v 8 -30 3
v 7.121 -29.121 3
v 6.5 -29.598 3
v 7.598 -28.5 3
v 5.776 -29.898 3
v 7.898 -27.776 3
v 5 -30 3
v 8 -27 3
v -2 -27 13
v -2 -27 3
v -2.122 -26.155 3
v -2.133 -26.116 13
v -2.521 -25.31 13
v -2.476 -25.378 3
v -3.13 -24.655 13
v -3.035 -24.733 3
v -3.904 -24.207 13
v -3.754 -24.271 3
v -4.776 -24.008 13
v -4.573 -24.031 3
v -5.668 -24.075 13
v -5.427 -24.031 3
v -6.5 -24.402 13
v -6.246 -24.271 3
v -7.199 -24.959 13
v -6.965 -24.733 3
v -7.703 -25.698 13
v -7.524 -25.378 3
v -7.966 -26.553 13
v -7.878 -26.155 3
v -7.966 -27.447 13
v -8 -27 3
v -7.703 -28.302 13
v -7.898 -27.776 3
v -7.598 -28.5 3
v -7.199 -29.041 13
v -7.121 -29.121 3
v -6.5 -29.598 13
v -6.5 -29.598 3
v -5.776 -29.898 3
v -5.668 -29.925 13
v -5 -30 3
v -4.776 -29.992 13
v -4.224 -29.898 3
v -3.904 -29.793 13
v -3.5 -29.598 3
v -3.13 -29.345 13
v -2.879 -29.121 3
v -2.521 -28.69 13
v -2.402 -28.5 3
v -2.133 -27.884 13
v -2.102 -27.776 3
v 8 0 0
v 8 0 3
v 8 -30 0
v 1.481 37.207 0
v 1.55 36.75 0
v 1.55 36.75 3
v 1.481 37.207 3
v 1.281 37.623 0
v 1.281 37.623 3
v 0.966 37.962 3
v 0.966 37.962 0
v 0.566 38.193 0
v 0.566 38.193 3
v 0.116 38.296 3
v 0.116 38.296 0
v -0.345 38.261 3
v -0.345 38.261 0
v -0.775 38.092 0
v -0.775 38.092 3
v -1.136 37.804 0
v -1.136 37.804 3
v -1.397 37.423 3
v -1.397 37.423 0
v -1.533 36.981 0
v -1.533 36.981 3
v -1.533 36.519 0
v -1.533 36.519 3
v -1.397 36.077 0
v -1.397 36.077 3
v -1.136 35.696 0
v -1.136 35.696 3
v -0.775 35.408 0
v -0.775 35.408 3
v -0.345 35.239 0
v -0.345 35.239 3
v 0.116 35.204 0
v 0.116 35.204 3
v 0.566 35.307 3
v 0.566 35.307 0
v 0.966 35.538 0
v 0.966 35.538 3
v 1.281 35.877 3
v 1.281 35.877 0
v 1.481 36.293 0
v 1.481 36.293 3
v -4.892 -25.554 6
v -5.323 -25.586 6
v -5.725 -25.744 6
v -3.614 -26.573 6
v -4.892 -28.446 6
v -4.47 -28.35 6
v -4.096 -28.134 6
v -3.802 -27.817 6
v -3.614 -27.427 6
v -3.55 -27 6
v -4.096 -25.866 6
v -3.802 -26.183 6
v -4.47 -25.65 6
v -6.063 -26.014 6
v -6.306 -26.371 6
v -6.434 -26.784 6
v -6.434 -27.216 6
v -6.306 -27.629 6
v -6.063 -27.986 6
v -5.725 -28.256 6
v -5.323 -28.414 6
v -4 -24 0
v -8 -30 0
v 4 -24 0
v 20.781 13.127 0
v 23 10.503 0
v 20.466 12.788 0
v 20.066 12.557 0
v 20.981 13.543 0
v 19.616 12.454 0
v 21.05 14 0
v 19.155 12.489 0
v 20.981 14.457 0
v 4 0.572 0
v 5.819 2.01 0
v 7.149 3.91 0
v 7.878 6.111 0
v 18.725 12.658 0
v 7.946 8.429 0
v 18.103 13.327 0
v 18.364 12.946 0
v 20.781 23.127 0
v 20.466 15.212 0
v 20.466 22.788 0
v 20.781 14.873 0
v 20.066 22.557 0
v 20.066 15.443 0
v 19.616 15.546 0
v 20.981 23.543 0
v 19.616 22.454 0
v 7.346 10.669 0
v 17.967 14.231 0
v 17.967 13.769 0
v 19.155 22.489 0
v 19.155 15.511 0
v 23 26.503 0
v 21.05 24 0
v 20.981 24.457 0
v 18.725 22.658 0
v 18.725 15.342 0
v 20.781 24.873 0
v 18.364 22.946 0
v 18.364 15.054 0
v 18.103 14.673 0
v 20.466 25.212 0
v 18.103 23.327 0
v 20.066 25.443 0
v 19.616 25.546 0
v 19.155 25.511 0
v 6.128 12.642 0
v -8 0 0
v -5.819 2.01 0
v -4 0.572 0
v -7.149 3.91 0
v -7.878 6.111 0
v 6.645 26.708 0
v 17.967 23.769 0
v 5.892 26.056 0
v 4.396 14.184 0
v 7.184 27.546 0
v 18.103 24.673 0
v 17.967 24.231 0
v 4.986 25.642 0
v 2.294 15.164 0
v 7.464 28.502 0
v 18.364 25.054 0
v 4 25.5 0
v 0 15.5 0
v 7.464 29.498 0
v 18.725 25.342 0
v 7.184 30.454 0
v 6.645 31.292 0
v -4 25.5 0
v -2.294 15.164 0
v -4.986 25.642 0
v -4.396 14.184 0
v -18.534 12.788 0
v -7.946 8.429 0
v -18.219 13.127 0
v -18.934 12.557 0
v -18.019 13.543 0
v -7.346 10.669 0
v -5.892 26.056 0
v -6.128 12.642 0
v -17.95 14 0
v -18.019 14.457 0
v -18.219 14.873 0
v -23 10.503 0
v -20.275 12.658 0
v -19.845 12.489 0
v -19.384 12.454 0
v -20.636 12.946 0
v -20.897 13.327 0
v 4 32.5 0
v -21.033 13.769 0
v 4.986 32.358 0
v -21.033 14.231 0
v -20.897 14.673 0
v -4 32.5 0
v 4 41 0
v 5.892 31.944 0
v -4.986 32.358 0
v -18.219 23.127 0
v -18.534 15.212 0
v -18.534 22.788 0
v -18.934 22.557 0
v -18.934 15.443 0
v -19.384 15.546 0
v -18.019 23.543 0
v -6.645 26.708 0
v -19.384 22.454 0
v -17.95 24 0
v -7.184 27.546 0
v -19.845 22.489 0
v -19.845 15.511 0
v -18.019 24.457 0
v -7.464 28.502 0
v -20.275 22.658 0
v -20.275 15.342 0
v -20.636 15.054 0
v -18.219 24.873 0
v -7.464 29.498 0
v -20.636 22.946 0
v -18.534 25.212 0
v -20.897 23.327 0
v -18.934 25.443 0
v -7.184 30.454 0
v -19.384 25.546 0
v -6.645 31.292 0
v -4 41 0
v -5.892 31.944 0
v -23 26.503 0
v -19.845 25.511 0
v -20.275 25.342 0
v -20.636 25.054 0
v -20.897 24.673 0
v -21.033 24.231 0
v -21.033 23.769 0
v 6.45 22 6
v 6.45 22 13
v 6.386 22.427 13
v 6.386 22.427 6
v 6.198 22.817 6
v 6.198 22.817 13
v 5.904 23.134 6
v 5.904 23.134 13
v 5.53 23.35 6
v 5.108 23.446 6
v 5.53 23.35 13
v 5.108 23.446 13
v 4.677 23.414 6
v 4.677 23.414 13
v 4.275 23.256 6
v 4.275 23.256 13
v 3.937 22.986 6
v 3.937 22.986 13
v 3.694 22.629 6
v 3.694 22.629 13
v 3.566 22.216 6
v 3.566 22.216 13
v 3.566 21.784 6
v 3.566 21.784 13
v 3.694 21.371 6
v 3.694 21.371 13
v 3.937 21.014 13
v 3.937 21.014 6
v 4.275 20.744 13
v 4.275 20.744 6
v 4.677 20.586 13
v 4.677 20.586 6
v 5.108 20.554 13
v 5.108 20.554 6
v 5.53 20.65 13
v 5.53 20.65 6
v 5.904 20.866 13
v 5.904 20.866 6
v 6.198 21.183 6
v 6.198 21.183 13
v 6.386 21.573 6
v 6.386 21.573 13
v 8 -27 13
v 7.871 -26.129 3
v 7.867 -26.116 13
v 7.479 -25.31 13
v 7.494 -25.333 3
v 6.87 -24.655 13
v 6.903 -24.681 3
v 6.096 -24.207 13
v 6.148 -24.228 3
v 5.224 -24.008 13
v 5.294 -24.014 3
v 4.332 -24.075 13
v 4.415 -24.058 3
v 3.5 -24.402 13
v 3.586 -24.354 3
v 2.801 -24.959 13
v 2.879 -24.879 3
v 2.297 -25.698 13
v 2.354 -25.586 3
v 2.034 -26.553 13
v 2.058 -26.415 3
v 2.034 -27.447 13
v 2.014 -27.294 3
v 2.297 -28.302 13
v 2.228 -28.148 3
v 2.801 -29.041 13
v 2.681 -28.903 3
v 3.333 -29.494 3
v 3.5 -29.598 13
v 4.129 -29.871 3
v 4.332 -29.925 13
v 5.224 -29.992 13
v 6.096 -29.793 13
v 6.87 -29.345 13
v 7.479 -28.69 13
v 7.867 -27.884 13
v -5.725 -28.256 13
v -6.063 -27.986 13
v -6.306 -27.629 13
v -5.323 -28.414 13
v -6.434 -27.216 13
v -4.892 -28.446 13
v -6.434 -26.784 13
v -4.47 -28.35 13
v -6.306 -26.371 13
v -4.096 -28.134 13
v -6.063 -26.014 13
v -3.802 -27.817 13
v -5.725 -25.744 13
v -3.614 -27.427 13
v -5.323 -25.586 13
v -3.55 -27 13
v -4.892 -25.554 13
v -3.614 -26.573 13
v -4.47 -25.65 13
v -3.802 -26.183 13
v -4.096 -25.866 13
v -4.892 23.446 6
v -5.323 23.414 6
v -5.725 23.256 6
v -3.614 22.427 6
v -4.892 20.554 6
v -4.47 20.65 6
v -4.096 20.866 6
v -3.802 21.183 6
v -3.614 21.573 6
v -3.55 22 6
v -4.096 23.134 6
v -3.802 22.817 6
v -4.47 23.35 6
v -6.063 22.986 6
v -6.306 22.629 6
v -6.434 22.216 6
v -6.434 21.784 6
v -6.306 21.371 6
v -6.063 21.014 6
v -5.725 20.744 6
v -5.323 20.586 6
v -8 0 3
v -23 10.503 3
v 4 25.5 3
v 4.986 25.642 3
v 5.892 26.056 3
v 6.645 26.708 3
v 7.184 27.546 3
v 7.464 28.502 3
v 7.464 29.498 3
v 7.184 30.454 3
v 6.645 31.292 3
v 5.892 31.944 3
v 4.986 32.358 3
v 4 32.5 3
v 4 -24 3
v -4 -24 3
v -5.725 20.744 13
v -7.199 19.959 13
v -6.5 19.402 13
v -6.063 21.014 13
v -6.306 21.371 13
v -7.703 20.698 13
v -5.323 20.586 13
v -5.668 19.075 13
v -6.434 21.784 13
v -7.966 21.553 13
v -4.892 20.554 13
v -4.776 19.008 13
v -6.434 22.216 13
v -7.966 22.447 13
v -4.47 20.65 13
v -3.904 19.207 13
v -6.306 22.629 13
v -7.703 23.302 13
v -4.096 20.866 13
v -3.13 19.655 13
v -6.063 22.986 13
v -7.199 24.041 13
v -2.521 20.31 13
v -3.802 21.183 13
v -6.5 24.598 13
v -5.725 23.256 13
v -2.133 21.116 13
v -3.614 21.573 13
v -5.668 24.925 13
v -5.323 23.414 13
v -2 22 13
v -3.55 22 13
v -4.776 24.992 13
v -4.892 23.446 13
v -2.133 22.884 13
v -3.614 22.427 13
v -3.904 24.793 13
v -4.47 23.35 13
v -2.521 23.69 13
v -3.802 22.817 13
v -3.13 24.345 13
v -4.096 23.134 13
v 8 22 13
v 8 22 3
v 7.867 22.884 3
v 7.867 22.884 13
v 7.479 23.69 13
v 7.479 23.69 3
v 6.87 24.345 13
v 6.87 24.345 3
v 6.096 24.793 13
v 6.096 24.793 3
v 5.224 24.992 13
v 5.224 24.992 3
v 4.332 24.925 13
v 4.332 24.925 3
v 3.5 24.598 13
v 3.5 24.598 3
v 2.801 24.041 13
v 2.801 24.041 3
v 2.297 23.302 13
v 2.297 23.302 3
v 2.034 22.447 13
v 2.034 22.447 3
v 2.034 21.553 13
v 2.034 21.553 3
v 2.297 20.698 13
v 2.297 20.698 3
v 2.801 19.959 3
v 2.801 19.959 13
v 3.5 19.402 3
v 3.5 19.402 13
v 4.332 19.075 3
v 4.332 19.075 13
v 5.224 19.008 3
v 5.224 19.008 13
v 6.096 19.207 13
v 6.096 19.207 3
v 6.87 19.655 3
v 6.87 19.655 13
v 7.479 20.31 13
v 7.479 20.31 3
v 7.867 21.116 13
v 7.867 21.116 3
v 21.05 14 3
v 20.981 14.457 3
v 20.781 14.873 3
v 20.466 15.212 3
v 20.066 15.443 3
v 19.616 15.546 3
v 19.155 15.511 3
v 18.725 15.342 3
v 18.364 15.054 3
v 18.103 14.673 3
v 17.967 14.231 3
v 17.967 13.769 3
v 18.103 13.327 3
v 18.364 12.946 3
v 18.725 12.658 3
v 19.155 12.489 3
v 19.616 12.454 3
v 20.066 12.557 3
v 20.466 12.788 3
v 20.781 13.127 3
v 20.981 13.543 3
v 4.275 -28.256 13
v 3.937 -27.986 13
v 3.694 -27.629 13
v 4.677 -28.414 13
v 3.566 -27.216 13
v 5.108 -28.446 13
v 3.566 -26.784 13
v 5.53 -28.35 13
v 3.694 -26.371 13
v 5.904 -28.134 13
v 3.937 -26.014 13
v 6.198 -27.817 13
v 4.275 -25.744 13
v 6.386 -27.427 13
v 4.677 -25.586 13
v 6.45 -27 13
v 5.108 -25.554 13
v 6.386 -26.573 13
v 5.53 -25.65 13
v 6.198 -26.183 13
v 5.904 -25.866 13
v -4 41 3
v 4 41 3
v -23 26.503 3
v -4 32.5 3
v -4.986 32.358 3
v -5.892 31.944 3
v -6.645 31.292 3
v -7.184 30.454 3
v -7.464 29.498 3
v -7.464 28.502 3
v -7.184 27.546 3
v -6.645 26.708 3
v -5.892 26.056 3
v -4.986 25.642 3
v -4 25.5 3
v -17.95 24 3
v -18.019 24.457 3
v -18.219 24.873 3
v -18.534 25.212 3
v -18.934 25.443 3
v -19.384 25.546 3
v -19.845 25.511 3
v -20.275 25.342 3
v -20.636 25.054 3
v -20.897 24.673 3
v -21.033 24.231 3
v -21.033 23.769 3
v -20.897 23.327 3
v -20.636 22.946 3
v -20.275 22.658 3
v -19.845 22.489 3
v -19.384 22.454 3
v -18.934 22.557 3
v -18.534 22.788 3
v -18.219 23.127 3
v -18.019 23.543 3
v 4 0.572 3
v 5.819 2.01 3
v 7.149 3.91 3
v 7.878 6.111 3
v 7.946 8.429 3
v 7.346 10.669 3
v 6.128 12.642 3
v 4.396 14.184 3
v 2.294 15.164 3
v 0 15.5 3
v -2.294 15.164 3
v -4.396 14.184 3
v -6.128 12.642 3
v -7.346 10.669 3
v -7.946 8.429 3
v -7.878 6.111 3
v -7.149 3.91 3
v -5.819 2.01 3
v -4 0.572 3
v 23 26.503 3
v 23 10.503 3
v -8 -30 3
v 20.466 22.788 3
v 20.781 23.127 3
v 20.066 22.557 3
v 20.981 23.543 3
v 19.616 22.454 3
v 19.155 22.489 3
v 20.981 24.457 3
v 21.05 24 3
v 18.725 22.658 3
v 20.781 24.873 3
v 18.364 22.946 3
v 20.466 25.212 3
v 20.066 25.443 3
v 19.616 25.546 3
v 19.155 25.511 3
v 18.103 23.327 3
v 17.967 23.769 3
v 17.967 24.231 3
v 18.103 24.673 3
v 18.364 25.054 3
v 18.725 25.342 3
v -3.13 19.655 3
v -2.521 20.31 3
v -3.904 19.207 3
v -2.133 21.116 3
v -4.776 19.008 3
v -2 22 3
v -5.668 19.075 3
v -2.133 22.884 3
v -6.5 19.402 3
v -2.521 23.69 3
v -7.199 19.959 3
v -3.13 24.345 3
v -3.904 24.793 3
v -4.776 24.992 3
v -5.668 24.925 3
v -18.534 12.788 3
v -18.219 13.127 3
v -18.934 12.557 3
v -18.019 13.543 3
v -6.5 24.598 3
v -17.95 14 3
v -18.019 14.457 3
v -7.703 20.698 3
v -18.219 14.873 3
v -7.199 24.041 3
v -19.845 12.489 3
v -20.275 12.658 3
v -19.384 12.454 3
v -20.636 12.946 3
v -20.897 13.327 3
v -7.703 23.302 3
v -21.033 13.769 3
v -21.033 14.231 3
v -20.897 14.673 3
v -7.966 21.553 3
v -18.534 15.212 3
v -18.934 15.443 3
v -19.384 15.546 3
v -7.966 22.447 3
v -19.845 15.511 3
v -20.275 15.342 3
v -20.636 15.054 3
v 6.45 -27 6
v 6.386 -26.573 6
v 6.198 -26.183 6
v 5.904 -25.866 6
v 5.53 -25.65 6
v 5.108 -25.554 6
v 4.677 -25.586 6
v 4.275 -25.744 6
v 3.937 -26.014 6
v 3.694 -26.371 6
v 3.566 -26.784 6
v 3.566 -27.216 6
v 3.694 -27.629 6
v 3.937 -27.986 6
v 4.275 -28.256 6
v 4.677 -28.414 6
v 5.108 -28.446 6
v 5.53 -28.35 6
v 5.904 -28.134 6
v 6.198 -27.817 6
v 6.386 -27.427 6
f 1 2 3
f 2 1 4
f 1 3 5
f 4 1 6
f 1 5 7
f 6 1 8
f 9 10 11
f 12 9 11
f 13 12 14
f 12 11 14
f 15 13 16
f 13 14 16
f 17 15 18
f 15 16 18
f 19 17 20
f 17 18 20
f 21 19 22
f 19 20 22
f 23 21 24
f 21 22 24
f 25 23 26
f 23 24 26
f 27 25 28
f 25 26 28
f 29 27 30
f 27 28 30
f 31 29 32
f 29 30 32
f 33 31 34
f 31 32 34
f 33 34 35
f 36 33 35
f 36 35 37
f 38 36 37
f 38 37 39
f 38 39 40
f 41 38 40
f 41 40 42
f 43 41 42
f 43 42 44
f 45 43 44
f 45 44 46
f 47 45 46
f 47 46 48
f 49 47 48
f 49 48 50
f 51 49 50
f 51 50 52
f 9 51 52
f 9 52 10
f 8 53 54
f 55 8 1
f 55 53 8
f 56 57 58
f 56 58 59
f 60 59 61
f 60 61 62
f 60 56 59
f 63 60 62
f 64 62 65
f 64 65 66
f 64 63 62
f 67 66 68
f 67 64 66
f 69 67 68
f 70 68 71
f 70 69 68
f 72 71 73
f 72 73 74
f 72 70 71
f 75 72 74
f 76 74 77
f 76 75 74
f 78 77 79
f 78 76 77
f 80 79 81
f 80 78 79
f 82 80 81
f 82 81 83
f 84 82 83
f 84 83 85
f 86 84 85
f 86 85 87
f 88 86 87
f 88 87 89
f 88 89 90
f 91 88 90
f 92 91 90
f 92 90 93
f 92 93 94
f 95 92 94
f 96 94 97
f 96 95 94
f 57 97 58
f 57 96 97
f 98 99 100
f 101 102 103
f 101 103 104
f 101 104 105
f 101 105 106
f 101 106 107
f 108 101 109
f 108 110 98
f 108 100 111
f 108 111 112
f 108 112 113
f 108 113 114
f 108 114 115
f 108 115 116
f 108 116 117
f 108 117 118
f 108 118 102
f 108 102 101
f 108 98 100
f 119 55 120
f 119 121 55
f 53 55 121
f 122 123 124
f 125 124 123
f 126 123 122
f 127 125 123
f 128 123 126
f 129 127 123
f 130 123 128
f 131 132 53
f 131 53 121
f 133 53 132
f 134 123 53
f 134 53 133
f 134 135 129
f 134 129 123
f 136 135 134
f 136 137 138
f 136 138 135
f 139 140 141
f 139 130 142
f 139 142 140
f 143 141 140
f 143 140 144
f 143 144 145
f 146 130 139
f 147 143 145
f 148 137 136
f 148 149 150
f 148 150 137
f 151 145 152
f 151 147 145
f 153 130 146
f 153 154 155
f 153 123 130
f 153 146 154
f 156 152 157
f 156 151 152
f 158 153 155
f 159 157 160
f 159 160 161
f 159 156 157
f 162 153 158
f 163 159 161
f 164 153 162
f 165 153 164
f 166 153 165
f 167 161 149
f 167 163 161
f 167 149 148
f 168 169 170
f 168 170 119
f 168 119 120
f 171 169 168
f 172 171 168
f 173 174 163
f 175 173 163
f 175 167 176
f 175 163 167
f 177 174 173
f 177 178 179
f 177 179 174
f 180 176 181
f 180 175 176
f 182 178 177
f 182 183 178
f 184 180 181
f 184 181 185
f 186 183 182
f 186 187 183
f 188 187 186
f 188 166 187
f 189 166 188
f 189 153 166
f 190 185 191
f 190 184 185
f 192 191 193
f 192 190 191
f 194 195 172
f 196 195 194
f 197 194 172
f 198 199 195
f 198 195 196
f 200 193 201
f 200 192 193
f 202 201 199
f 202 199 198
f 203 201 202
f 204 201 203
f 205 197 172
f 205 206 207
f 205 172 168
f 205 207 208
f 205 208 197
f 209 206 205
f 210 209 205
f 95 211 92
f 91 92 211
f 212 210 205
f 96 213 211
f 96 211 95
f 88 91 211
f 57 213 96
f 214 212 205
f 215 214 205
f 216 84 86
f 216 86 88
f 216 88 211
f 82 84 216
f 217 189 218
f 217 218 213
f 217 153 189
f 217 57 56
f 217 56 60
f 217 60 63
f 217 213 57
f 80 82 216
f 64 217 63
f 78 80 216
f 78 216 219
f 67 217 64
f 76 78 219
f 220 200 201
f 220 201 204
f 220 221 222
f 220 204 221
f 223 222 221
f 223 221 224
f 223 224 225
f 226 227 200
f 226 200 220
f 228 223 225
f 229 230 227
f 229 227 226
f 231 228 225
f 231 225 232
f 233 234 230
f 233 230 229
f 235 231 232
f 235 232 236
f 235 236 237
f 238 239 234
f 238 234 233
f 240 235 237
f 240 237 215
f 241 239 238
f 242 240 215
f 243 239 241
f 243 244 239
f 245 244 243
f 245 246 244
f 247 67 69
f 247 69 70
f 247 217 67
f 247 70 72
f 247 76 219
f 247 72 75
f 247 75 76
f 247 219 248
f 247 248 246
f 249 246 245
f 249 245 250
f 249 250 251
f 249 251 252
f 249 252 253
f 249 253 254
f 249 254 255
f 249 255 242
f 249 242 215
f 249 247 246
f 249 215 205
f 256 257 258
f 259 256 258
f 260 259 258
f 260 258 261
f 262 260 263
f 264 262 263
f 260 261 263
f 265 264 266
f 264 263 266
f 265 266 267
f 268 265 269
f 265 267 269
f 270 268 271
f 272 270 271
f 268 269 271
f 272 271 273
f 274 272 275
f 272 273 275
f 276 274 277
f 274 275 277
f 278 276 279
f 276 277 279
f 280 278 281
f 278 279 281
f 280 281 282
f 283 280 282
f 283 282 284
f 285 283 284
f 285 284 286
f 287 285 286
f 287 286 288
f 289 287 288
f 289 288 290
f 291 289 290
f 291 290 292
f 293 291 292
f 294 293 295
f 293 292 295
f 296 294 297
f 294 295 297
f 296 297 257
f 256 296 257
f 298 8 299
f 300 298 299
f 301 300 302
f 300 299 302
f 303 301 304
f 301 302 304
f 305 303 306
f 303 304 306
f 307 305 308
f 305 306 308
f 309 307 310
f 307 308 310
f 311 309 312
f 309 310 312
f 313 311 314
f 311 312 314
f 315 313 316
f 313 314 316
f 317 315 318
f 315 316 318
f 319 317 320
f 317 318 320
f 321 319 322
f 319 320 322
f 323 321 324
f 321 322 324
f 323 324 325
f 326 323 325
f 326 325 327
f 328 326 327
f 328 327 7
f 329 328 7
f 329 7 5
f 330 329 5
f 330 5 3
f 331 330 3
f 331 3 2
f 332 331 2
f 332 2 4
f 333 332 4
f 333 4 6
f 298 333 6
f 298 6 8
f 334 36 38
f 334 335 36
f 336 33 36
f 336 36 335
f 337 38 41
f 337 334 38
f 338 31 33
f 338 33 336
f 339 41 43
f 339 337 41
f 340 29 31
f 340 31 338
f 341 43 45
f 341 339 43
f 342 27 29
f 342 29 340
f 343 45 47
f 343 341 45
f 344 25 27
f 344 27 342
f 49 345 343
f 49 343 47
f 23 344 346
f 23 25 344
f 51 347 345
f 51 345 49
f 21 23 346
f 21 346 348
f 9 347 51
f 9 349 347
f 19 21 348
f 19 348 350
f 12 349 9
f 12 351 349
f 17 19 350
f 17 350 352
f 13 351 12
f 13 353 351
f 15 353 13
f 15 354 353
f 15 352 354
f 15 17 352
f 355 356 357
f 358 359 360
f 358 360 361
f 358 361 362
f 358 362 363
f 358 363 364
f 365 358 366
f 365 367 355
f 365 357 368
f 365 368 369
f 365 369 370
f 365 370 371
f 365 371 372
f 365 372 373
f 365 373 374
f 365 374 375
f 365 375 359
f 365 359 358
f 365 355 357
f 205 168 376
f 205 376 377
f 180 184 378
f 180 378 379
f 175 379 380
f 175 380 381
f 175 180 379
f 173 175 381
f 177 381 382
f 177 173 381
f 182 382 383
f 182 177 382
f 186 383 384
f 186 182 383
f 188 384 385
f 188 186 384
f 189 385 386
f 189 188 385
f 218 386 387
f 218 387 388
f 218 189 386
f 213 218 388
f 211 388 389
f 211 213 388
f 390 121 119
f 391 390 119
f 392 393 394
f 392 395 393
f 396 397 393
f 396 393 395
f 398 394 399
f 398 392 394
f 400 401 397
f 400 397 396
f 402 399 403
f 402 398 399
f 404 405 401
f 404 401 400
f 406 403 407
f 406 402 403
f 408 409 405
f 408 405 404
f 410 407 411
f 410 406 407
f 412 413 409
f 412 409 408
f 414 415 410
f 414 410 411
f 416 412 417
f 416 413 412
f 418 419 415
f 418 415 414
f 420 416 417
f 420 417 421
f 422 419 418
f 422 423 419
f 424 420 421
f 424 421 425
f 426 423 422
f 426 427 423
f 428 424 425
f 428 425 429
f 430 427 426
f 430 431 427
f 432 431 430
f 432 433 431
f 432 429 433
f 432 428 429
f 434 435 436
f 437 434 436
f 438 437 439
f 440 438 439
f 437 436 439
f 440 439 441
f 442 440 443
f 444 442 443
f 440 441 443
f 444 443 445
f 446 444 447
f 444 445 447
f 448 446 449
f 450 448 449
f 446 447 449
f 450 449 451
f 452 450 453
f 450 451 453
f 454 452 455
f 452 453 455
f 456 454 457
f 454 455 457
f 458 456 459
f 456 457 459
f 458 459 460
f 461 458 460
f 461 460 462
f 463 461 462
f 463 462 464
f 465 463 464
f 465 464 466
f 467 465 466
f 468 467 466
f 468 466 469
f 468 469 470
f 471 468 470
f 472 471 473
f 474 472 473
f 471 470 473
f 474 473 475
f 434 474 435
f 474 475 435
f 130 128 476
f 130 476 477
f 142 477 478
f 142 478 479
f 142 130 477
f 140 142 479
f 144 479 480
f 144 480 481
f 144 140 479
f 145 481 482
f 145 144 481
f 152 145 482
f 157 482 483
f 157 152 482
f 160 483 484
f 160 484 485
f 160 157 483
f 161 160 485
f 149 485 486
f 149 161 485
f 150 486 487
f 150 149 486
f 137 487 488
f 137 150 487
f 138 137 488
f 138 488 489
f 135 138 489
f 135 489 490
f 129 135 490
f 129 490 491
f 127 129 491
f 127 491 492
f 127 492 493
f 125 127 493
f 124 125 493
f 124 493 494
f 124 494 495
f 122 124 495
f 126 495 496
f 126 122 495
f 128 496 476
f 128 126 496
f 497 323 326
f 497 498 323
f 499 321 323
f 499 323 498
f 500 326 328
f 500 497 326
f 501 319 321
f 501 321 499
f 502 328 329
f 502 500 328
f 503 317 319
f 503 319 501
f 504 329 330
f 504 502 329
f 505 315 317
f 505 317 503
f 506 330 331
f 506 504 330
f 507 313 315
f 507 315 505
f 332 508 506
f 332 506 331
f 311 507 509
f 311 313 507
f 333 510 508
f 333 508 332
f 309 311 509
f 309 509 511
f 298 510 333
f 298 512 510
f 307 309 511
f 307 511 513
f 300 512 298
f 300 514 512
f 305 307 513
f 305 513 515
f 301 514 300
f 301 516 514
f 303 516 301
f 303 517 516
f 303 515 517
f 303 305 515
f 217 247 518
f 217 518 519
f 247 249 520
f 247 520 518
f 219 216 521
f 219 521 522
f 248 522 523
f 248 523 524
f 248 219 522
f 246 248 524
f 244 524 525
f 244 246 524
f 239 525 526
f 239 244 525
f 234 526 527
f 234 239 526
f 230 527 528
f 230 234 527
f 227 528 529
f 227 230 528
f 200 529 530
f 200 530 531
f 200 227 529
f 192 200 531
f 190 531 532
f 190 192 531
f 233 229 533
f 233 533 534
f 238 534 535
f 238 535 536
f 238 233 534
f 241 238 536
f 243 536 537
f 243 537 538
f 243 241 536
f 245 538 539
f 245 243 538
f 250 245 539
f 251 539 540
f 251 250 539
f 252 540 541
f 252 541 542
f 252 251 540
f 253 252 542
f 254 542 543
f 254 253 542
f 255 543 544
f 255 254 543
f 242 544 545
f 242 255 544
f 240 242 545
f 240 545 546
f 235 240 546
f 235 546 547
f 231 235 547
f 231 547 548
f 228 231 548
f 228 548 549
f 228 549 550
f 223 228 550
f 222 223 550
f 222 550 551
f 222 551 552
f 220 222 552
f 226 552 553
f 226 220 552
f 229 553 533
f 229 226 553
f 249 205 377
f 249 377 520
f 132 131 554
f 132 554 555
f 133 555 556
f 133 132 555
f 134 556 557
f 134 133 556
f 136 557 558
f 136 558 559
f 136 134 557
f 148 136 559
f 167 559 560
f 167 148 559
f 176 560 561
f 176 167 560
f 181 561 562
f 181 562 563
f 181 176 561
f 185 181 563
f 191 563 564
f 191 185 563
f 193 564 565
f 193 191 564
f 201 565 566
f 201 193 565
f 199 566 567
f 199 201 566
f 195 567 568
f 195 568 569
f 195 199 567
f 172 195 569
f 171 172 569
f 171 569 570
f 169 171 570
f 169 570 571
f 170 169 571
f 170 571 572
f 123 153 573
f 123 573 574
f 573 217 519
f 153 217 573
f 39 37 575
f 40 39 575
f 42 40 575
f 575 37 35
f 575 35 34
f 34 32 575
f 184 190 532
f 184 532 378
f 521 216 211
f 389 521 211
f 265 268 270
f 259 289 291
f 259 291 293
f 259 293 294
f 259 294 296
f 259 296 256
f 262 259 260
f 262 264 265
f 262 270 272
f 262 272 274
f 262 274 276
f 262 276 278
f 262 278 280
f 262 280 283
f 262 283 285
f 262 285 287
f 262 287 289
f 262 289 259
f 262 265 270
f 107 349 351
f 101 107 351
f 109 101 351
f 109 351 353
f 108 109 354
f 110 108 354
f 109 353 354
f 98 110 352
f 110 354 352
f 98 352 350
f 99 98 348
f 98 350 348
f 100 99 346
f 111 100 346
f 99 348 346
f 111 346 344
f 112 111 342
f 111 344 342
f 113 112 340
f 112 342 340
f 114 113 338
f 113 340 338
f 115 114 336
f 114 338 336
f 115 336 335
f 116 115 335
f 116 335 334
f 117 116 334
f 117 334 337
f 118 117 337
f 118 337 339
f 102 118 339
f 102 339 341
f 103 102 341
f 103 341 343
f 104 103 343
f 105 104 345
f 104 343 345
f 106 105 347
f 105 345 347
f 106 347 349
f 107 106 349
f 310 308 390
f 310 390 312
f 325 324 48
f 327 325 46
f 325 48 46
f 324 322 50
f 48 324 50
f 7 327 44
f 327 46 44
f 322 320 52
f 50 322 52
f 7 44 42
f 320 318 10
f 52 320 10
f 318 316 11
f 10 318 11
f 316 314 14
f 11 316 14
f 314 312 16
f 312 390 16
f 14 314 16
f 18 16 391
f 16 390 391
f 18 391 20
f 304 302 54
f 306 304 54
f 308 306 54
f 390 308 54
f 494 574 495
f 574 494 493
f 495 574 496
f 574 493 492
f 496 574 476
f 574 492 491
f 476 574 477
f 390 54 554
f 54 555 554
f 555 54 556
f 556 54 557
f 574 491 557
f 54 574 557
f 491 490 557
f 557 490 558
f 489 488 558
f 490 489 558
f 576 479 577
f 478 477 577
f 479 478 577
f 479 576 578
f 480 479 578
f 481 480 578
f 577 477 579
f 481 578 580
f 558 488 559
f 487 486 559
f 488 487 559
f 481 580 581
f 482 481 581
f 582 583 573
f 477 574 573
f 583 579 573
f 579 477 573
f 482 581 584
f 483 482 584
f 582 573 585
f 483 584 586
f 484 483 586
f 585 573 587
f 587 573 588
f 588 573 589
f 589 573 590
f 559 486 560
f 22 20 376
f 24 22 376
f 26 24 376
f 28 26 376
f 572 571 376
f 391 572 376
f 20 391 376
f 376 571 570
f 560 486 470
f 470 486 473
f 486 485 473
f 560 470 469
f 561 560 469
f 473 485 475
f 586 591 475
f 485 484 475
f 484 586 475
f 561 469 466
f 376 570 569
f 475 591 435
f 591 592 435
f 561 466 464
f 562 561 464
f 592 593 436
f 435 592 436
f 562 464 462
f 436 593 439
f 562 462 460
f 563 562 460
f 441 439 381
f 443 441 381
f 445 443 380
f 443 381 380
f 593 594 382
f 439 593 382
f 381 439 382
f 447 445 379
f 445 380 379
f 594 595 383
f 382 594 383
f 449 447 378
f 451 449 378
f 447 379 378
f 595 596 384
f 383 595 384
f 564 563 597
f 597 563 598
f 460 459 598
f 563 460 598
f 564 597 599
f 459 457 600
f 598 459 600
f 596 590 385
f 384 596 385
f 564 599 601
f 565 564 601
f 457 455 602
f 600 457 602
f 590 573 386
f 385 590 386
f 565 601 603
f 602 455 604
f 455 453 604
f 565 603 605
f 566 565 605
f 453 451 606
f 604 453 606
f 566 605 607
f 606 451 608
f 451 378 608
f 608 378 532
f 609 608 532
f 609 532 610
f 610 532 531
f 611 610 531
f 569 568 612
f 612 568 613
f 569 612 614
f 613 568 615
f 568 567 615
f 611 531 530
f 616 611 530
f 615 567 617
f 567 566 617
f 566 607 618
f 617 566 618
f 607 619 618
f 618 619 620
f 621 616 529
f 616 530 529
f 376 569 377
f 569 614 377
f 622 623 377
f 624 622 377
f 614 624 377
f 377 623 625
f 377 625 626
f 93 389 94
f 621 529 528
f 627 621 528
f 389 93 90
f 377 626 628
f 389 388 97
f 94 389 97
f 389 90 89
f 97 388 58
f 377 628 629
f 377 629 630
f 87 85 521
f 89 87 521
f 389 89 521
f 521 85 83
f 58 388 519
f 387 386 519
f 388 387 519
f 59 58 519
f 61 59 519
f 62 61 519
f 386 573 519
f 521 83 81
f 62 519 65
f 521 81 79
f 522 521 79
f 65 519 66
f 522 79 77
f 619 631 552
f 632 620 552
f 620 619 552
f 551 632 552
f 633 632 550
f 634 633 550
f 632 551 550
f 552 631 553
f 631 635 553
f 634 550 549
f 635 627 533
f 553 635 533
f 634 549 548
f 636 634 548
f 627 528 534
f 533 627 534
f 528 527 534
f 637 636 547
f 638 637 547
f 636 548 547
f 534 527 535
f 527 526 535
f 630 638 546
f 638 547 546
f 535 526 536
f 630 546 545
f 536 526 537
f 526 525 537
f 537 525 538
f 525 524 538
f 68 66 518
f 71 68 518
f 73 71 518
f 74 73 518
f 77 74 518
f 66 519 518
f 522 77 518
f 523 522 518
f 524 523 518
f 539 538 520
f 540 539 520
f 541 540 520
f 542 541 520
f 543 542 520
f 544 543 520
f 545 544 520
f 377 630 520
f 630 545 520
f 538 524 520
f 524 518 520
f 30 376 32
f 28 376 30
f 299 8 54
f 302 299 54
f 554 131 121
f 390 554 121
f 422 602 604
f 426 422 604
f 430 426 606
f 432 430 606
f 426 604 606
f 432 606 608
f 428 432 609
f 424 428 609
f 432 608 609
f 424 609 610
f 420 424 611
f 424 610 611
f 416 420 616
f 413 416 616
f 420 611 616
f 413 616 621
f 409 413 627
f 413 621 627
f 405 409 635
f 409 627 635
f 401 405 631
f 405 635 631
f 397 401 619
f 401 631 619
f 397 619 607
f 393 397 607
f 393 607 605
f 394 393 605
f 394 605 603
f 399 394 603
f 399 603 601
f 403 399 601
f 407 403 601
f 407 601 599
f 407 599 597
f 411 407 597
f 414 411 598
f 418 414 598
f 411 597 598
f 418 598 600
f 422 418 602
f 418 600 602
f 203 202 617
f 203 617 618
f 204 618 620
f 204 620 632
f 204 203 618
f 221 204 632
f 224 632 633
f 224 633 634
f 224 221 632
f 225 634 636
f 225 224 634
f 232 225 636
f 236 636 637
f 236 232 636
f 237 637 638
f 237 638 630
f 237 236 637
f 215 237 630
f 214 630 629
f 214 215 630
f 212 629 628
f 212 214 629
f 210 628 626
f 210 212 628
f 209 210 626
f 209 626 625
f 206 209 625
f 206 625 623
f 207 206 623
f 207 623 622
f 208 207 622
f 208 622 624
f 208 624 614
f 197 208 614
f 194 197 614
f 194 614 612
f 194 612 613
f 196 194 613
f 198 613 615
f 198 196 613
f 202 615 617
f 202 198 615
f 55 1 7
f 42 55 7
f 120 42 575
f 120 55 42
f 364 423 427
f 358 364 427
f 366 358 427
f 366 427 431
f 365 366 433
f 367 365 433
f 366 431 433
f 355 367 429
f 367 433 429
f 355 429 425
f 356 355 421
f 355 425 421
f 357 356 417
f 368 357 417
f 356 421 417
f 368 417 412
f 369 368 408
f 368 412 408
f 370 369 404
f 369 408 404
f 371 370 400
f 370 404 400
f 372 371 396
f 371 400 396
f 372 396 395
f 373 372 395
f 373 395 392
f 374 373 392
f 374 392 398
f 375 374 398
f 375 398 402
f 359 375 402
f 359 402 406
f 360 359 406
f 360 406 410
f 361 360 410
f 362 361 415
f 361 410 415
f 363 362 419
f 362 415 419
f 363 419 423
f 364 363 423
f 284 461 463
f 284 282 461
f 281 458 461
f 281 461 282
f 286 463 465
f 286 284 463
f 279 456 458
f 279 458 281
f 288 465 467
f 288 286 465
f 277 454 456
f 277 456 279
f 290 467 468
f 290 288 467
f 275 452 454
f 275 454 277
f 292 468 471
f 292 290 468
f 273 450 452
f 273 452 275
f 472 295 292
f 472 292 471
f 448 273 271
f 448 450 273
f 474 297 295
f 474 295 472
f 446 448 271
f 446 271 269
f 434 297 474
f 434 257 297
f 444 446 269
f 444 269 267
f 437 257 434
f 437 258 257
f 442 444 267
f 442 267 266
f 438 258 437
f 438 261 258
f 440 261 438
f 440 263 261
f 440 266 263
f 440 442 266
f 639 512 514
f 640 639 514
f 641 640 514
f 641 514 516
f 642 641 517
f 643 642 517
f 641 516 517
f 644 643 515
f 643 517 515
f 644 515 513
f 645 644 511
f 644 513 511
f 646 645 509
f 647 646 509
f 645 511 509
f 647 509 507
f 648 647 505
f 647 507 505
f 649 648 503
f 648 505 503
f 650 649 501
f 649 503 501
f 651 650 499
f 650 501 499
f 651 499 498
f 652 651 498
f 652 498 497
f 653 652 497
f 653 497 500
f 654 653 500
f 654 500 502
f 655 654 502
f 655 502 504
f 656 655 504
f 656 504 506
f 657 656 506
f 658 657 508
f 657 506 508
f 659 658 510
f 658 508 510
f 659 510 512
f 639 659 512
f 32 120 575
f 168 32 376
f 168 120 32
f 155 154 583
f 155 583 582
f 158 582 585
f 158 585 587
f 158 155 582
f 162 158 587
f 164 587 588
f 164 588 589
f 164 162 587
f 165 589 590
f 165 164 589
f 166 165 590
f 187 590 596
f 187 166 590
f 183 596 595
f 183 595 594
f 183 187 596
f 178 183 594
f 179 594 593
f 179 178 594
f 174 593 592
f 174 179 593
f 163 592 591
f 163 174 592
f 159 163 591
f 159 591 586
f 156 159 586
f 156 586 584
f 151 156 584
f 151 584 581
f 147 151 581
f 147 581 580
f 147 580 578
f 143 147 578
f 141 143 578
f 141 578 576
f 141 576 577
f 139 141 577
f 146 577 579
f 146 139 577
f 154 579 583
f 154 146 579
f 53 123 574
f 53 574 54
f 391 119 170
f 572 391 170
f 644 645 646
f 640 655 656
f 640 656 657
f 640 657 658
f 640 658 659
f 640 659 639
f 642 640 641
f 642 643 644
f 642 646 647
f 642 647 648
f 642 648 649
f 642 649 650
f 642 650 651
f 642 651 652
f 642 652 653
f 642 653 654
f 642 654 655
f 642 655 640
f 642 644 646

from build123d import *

# Parameters (mm, degrees)
SKETCH_R     = 1.55
PAD_DEPTH    = 3
SKETCH001_R  = 3
PAD001_DEPTH = 10
SKETCH002_R  = 1.45
POCKET_DEPTH = 7


with BuildPart() as part:
    # Sketch → Pad (new body)
    with BuildSketch(Plane.XY):
        Polygon((8, -30), (-8, -30), (-8, 0), (-23, 10.503113), (-23, 26.503113), (-4, 41), (4, 41), (23, 26.503113), (23, 10.503113), (8, 0), align=None)
        with Locations((0, 36.75)):
            Circle(SKETCH_R, mode=Mode.SUBTRACT)
        with Locations((19.5, 24)):
            Circle(SKETCH_R, mode=Mode.SUBTRACT)
        with Locations((19.5, 14)):
            Circle(SKETCH_R, mode=Mode.SUBTRACT)
        with Locations((-19.5, 24)):
            Circle(SKETCH_R, mode=Mode.SUBTRACT)
        with Locations((-19.5, 14)):
            Circle(SKETCH_R, mode=Mode.SUBTRACT)
        with BuildLine():
            ThreePointArc((-4, 32.5), (-7.5, 29), (-4, 25.5))
            Line((-4, 25.5), (4, 25.5))
            ThreePointArc((4, 25.5), (7.5, 29), (4, 32.5))
            Line((-4, 32.5), (4, 32.5))
        make_face(mode=Mode.SUBTRACT)
        with BuildLine():
            ThreePointArc((4, 0.571797), (0, 15.5), (-4, 0.571797))
            Line((-4, -24), (-4, 0.571797))
            Line((4, -24), (-4, -24))
            Line((4, 0.571797), (4, -24))
        make_face(mode=Mode.SUBTRACT)
    extrude(amount=PAD_DEPTH)

    # Sketch001 (on Face25 of Pad) → Pad001 (join)
    with BuildSketch(Plane.XY.offset(3)):
        with Locations((-5, 22)):
            Circle(SKETCH001_R)
        with Locations((5, 22)):
            Circle(SKETCH001_R)
        with Locations((5, -27)):
            Circle(SKETCH001_R)
        with Locations((-5, -27)):
            Circle(SKETCH001_R)
    extrude(amount=PAD001_DEPTH)

    # Sketch002 (on Face35 of Pad001) → Pocket (cut)
    with BuildSketch(Plane.XY.offset(13)):
        with Locations((-5, 22)):
            Circle(SKETCH002_R)
        with Locations((5, 22)):
            Circle(SKETCH002_R)
        with Locations((5, -27)):
            Circle(SKETCH002_R)
        with Locations((-5, -27)):
            Circle(SKETCH002_R)
    extrude(amount=-POCKET_DEPTH, mode=Mode.SUBTRACT)


solid = part.part
